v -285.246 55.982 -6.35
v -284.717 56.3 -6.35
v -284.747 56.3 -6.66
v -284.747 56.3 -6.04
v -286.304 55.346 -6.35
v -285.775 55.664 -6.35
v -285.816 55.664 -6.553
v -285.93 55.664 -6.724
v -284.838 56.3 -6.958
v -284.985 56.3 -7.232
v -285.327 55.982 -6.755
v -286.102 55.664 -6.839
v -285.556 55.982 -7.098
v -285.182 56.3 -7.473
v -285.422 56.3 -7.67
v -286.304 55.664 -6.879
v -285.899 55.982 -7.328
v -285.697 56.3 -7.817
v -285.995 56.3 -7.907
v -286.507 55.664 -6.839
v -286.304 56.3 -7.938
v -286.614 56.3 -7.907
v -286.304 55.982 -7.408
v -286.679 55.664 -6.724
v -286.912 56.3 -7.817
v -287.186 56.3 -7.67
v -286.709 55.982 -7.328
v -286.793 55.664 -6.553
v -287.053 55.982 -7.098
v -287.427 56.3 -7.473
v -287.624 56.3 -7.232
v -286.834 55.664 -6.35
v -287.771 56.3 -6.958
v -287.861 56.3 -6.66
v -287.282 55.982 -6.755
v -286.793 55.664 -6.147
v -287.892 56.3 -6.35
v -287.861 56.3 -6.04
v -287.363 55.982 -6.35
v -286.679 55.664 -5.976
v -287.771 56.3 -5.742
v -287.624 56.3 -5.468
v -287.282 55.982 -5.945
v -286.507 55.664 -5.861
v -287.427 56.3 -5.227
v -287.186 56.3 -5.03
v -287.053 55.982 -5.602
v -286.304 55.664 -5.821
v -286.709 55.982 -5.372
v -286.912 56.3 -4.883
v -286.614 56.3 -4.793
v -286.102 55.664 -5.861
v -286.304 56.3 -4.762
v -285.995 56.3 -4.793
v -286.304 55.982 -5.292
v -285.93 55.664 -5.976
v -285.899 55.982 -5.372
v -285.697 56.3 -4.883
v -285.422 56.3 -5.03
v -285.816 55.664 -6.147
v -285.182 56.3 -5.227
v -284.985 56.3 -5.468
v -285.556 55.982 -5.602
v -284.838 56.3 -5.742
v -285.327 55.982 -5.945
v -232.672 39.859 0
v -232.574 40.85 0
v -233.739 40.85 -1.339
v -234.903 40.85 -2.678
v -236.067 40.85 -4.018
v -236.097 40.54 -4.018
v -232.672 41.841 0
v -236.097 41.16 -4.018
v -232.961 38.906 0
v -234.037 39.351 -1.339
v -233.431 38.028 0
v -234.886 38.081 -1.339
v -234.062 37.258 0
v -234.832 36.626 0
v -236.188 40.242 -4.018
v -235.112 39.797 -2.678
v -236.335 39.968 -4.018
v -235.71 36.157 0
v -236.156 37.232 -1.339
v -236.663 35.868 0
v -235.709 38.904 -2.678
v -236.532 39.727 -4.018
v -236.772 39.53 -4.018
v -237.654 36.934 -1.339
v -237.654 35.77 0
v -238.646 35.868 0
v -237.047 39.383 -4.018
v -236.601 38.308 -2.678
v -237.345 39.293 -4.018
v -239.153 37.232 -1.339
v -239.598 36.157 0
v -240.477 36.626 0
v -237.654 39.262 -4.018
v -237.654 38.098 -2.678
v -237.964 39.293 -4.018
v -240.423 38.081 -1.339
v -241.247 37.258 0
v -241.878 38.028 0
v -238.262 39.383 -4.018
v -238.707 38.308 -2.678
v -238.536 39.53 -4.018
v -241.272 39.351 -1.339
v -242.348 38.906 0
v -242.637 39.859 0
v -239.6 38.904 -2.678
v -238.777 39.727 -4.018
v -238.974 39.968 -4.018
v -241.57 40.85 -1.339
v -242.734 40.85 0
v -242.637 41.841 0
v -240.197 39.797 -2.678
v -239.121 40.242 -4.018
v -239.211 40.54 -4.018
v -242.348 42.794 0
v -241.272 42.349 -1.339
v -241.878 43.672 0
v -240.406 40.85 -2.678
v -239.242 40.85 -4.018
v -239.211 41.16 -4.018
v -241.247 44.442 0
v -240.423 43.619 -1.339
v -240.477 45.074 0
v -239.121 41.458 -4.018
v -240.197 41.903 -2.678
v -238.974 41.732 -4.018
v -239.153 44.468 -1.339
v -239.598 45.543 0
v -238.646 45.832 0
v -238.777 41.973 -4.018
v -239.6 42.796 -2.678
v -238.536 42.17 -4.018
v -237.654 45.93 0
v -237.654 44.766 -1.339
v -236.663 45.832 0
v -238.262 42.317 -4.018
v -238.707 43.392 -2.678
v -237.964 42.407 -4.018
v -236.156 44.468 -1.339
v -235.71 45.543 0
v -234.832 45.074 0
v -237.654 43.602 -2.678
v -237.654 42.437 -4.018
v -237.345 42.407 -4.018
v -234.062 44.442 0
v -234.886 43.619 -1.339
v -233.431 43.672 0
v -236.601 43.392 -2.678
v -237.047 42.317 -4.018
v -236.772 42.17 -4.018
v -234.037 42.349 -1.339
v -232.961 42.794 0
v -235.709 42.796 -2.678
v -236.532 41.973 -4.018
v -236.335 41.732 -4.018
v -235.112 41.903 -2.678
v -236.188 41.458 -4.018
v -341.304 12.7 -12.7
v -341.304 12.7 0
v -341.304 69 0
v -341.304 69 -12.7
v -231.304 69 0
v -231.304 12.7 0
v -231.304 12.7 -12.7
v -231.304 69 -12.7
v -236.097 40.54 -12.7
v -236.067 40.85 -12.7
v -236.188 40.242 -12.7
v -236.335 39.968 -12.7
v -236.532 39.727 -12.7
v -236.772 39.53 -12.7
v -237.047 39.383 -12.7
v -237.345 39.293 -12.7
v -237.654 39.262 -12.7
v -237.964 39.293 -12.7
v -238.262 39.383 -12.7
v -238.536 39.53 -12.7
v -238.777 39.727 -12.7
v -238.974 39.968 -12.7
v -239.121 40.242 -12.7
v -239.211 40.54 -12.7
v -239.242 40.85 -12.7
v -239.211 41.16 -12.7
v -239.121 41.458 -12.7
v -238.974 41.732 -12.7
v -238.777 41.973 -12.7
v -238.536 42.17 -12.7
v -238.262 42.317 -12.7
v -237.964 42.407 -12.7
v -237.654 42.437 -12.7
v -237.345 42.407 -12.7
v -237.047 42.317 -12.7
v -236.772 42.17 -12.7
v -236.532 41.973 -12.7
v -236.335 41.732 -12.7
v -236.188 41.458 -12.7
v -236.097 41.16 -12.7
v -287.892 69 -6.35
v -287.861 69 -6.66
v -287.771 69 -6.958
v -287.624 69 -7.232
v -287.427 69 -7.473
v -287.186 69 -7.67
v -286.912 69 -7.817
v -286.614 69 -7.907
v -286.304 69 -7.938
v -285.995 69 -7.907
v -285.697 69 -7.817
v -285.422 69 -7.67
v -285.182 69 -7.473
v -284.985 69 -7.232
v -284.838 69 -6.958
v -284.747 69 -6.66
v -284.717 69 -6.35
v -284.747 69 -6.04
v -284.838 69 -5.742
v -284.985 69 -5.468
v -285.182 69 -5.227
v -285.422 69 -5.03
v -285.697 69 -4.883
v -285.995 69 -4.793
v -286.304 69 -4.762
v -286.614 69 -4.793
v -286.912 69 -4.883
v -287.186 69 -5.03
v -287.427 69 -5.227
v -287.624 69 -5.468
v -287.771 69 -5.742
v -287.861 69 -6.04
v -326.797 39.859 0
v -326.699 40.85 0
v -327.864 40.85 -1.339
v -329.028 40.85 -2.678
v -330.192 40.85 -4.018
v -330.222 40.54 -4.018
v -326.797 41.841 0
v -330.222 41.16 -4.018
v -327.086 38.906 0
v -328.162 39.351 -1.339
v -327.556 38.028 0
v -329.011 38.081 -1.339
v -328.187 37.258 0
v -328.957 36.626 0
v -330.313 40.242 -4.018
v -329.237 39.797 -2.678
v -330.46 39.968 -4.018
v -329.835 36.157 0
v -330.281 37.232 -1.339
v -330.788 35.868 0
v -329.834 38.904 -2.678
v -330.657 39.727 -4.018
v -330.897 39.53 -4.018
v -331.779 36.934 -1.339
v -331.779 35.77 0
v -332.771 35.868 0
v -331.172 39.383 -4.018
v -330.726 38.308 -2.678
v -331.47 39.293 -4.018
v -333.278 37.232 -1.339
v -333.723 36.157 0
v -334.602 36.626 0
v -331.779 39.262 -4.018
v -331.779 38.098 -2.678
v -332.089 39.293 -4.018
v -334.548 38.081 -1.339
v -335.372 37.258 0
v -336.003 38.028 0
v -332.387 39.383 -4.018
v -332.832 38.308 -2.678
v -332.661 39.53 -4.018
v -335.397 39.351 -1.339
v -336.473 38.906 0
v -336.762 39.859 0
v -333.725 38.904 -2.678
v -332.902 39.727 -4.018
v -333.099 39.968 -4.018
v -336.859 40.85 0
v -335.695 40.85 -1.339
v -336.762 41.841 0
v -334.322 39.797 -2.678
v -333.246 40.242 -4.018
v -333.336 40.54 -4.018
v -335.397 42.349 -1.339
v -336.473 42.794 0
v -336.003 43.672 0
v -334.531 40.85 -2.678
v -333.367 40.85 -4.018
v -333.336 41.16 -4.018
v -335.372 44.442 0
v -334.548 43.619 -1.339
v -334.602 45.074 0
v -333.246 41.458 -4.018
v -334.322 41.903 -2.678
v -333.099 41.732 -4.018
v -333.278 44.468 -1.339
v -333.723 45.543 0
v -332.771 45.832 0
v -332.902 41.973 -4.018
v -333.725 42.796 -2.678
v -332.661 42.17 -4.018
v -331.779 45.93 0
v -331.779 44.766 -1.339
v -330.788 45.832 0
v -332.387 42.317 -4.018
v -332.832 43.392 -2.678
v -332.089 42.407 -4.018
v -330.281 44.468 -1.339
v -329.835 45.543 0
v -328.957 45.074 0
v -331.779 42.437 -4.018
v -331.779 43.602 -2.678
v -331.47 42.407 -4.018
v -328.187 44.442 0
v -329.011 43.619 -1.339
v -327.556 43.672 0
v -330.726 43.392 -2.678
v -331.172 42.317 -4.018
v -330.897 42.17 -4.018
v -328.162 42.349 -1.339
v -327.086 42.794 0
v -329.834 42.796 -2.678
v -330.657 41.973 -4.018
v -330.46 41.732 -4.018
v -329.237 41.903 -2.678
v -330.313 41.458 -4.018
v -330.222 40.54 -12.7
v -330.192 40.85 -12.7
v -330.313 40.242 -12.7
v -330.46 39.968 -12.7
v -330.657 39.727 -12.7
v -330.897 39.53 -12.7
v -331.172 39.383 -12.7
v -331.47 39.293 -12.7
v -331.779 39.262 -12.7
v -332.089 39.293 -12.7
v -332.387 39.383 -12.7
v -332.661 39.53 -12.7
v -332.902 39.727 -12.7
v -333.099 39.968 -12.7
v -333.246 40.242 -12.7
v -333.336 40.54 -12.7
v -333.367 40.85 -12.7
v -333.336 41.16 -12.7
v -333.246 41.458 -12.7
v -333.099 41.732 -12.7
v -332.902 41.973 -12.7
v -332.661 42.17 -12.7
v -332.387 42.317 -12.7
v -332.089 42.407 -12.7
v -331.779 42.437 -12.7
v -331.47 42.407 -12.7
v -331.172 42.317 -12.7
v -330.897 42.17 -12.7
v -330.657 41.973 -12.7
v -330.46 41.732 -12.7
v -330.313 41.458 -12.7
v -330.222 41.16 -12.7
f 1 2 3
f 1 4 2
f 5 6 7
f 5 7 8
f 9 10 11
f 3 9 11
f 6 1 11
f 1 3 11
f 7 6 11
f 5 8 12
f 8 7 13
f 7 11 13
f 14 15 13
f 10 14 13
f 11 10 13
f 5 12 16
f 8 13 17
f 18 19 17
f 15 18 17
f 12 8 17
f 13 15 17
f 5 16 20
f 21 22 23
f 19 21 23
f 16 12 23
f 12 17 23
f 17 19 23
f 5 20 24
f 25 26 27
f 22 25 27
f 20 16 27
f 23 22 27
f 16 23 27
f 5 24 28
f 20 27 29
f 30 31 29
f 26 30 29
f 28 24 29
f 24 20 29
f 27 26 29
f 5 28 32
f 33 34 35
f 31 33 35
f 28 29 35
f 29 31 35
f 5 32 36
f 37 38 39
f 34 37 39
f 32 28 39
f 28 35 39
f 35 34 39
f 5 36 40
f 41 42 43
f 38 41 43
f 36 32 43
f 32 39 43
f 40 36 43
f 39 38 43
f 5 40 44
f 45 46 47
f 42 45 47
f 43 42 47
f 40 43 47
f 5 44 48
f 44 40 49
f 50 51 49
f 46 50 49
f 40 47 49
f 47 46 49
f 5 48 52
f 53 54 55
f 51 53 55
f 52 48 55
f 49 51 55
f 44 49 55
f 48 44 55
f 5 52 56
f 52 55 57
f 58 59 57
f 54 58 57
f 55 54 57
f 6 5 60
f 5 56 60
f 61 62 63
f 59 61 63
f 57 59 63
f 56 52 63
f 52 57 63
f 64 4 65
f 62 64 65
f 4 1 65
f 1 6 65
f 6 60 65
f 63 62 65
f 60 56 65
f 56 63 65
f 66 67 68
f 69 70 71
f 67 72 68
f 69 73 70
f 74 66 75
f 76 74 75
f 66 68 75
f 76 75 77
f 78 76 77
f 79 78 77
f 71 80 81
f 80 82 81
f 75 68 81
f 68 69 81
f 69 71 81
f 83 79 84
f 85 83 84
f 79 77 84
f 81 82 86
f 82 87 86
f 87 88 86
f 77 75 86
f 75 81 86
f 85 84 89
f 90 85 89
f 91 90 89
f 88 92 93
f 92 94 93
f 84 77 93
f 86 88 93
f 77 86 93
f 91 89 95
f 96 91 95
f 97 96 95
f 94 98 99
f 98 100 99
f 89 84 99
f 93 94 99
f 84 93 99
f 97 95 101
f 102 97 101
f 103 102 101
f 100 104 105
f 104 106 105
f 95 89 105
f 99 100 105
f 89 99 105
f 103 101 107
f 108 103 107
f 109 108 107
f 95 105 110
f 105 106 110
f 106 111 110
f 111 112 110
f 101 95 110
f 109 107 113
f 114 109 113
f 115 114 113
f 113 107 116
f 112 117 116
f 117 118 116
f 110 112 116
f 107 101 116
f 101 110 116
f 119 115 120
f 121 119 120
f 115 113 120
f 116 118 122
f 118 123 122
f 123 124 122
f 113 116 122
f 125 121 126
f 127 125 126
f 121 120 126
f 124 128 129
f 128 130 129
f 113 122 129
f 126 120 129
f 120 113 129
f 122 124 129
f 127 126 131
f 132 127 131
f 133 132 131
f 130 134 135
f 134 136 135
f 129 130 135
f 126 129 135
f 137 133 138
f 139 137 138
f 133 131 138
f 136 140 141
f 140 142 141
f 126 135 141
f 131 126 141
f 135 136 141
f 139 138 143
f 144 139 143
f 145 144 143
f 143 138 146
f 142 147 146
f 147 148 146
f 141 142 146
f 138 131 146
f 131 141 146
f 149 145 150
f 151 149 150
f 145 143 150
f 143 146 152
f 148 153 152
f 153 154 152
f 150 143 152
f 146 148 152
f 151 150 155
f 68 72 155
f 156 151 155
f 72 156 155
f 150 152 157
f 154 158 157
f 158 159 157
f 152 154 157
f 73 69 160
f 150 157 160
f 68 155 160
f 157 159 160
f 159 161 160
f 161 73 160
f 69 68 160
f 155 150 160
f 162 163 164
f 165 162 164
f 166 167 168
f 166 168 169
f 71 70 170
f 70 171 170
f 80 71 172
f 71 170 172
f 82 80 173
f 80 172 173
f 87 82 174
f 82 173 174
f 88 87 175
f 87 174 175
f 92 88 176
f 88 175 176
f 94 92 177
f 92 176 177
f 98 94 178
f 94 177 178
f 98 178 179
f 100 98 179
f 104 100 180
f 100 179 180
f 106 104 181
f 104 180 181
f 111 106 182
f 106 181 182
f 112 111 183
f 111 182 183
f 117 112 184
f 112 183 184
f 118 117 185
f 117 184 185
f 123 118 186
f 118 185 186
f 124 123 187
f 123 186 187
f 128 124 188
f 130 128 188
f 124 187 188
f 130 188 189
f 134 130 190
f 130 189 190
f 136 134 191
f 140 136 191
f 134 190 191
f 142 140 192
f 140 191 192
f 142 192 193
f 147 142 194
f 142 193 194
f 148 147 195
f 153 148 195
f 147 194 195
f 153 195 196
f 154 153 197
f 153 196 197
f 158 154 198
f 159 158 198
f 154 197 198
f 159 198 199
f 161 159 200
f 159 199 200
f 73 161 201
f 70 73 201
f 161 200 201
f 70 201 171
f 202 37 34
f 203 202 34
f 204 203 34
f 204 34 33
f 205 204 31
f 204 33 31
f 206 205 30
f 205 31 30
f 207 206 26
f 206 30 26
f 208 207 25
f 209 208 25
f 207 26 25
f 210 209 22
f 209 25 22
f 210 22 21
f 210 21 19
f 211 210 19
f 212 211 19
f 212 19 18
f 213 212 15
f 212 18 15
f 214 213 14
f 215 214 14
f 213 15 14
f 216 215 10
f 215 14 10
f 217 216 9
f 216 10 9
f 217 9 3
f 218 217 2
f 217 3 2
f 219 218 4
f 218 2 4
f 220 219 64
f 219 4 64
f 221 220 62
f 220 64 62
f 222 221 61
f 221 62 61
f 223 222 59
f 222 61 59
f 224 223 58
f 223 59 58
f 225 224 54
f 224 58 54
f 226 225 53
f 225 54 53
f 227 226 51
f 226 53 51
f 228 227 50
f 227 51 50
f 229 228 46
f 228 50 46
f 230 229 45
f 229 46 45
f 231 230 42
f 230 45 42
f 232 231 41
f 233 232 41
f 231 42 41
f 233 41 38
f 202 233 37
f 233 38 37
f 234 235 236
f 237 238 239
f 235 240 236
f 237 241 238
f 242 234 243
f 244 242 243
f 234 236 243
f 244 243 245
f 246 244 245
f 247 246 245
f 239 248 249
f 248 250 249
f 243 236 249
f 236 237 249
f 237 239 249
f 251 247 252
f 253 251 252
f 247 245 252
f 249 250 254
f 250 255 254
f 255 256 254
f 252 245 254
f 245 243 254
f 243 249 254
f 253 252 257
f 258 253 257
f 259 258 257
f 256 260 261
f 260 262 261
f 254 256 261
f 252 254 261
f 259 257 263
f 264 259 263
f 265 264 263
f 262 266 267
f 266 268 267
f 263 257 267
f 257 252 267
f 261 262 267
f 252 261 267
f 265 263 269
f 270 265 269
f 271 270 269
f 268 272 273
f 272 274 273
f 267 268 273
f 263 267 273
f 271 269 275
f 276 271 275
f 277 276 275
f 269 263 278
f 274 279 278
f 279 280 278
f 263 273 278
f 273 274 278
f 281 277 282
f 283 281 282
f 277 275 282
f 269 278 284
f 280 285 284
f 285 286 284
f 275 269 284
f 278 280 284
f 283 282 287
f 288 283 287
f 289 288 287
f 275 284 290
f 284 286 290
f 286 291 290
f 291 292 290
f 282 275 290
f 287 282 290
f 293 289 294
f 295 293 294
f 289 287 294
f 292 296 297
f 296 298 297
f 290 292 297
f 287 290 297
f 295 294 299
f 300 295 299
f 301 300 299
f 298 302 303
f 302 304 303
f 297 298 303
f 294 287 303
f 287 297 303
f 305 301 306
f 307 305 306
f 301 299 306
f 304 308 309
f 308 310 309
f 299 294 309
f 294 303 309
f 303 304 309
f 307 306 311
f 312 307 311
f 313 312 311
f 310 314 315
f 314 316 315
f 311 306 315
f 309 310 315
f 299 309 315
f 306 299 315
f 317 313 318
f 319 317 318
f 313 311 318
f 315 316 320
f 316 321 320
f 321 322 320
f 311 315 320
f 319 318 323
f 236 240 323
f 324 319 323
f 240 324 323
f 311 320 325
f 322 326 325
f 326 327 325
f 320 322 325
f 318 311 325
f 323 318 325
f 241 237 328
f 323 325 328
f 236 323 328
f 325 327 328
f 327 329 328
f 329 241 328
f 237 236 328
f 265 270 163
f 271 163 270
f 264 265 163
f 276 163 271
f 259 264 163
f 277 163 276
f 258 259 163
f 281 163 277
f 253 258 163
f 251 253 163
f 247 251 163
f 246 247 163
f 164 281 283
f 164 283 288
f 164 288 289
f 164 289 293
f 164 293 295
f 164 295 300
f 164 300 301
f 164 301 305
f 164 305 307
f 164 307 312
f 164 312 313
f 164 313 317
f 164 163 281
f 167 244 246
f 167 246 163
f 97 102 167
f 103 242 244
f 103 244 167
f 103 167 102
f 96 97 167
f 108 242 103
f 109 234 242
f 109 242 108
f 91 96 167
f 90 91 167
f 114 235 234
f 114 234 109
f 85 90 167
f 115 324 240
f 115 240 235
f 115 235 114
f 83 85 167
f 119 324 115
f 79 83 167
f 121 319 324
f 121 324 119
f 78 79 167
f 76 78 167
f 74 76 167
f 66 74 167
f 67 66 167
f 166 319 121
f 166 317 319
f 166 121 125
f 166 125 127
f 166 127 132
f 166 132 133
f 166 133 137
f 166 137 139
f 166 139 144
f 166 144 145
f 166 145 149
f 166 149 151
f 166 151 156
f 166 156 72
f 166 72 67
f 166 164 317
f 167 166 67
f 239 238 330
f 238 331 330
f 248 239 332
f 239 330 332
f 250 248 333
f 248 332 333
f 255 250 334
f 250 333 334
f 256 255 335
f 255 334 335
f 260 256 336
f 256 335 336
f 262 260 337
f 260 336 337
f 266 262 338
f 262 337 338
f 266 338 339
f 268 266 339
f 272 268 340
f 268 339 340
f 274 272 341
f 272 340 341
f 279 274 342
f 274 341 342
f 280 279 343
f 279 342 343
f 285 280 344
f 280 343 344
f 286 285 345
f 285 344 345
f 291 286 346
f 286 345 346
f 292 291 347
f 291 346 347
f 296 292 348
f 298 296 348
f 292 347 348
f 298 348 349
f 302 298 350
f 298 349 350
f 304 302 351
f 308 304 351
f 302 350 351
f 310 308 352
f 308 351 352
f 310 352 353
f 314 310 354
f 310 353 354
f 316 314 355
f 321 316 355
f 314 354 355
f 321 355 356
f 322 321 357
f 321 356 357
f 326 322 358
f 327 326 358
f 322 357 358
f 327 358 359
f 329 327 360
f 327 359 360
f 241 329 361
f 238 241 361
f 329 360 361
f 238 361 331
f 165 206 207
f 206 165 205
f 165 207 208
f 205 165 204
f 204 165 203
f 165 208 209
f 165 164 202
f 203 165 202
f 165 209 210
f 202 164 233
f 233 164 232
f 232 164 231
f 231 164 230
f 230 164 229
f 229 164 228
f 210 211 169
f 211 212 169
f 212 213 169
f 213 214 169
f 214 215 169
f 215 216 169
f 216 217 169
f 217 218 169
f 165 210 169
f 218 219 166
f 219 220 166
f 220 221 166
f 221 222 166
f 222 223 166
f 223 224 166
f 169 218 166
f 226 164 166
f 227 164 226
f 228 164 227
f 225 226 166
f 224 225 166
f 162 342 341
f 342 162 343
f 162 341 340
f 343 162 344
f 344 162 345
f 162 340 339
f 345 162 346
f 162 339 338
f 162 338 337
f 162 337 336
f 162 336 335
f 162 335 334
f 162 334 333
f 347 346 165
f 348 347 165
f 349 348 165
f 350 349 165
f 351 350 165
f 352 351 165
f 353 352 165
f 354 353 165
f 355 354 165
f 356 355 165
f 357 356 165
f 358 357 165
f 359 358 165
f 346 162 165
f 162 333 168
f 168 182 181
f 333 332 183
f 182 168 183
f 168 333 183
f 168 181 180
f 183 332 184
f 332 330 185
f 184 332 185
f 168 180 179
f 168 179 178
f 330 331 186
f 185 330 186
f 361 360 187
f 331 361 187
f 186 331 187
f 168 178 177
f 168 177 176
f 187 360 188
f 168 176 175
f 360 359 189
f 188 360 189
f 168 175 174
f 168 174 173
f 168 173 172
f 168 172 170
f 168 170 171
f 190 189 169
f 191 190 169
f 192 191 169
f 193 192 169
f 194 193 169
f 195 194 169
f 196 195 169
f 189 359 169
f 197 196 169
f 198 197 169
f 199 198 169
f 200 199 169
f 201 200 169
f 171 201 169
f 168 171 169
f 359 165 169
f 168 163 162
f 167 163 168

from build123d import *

# Parameters (mm, degrees)
SKETCH2_W           = 110
SKETCH2_H           = 56.3
BOSS_EXTRUDE1_DEPTH = 12.7
HOLE_D              = 3.175
HOLE_DEPTH          = 31.75
HOLE_CSINK_D        = 10.16
HOLE_CSINK_ANGLE    = 82
HOLE_TIP            = 0.953866233
HOLE1_D             = 3.175
HOLE1_DEPTH         = 31.75
HOLE1_CSINK_D       = 10.16
HOLE1_CSINK_ANGLE   = 82
HOLE1_TIP           = 0.953866233


with BuildPart() as part:
    # Sketch2 → Boss-Extrude1 (new body)
    with BuildSketch(Plane.XY):
        with Locations((-286.304465963, 40.85)):
            Rectangle(SKETCH2_W, SKETCH2_H)
    extrude(amount=-BOSS_EXTRUDE1_DEPTH)

    # Hole
    with Locations(Plane(origin=(-124.004465969, 277.286738577, 0), x_dir=(-1, 0, 0), z_dir=(0, 0, 1))):
        with Locations((113.649999994, 236.436738577), (207.774999994, 236.436738577)):
            CounterSinkHole(HOLE_D / 2, HOLE_CSINK_D / 2, depth=HOLE_DEPTH, counter_sink_angle=HOLE_CSINK_ANGLE)
            with Locations((0, 0, -(HOLE_DEPTH + HOLE_TIP / 2))):  # 118° drill point
                Cone(0, HOLE_D / 2, HOLE_TIP, mode=Mode.SUBTRACT)

    # Hole1
    with Locations(Plane(origin=(-124.004465969, 88.05, -14.975709941), x_dir=(1, 0, 0), z_dir=(0, 1, 0))):
        with Locations((-162.299999994, -8.625709941), (-113.649999994, 50.157623392), (-113.649999994, 102.590956725), (162.299999994, -8.625709941), (113.649999994, 50.157623392), (113.649999994, 102.590956725), (63.85, 161.374290059), (0, 161.374290059), (-63.85, 161.374290059)):
            CounterSinkHole(HOLE1_D / 2, HOLE1_CSINK_D / 2, depth=HOLE1_DEPTH, counter_sink_angle=HOLE1_CSINK_ANGLE)
            with Locations((0, 0, -(HOLE1_DEPTH + HOLE1_TIP / 2))):  # 118° drill point
                Cone(0, HOLE1_D / 2, HOLE1_TIP, mode=Mode.SUBTRACT)


solid = part.part
